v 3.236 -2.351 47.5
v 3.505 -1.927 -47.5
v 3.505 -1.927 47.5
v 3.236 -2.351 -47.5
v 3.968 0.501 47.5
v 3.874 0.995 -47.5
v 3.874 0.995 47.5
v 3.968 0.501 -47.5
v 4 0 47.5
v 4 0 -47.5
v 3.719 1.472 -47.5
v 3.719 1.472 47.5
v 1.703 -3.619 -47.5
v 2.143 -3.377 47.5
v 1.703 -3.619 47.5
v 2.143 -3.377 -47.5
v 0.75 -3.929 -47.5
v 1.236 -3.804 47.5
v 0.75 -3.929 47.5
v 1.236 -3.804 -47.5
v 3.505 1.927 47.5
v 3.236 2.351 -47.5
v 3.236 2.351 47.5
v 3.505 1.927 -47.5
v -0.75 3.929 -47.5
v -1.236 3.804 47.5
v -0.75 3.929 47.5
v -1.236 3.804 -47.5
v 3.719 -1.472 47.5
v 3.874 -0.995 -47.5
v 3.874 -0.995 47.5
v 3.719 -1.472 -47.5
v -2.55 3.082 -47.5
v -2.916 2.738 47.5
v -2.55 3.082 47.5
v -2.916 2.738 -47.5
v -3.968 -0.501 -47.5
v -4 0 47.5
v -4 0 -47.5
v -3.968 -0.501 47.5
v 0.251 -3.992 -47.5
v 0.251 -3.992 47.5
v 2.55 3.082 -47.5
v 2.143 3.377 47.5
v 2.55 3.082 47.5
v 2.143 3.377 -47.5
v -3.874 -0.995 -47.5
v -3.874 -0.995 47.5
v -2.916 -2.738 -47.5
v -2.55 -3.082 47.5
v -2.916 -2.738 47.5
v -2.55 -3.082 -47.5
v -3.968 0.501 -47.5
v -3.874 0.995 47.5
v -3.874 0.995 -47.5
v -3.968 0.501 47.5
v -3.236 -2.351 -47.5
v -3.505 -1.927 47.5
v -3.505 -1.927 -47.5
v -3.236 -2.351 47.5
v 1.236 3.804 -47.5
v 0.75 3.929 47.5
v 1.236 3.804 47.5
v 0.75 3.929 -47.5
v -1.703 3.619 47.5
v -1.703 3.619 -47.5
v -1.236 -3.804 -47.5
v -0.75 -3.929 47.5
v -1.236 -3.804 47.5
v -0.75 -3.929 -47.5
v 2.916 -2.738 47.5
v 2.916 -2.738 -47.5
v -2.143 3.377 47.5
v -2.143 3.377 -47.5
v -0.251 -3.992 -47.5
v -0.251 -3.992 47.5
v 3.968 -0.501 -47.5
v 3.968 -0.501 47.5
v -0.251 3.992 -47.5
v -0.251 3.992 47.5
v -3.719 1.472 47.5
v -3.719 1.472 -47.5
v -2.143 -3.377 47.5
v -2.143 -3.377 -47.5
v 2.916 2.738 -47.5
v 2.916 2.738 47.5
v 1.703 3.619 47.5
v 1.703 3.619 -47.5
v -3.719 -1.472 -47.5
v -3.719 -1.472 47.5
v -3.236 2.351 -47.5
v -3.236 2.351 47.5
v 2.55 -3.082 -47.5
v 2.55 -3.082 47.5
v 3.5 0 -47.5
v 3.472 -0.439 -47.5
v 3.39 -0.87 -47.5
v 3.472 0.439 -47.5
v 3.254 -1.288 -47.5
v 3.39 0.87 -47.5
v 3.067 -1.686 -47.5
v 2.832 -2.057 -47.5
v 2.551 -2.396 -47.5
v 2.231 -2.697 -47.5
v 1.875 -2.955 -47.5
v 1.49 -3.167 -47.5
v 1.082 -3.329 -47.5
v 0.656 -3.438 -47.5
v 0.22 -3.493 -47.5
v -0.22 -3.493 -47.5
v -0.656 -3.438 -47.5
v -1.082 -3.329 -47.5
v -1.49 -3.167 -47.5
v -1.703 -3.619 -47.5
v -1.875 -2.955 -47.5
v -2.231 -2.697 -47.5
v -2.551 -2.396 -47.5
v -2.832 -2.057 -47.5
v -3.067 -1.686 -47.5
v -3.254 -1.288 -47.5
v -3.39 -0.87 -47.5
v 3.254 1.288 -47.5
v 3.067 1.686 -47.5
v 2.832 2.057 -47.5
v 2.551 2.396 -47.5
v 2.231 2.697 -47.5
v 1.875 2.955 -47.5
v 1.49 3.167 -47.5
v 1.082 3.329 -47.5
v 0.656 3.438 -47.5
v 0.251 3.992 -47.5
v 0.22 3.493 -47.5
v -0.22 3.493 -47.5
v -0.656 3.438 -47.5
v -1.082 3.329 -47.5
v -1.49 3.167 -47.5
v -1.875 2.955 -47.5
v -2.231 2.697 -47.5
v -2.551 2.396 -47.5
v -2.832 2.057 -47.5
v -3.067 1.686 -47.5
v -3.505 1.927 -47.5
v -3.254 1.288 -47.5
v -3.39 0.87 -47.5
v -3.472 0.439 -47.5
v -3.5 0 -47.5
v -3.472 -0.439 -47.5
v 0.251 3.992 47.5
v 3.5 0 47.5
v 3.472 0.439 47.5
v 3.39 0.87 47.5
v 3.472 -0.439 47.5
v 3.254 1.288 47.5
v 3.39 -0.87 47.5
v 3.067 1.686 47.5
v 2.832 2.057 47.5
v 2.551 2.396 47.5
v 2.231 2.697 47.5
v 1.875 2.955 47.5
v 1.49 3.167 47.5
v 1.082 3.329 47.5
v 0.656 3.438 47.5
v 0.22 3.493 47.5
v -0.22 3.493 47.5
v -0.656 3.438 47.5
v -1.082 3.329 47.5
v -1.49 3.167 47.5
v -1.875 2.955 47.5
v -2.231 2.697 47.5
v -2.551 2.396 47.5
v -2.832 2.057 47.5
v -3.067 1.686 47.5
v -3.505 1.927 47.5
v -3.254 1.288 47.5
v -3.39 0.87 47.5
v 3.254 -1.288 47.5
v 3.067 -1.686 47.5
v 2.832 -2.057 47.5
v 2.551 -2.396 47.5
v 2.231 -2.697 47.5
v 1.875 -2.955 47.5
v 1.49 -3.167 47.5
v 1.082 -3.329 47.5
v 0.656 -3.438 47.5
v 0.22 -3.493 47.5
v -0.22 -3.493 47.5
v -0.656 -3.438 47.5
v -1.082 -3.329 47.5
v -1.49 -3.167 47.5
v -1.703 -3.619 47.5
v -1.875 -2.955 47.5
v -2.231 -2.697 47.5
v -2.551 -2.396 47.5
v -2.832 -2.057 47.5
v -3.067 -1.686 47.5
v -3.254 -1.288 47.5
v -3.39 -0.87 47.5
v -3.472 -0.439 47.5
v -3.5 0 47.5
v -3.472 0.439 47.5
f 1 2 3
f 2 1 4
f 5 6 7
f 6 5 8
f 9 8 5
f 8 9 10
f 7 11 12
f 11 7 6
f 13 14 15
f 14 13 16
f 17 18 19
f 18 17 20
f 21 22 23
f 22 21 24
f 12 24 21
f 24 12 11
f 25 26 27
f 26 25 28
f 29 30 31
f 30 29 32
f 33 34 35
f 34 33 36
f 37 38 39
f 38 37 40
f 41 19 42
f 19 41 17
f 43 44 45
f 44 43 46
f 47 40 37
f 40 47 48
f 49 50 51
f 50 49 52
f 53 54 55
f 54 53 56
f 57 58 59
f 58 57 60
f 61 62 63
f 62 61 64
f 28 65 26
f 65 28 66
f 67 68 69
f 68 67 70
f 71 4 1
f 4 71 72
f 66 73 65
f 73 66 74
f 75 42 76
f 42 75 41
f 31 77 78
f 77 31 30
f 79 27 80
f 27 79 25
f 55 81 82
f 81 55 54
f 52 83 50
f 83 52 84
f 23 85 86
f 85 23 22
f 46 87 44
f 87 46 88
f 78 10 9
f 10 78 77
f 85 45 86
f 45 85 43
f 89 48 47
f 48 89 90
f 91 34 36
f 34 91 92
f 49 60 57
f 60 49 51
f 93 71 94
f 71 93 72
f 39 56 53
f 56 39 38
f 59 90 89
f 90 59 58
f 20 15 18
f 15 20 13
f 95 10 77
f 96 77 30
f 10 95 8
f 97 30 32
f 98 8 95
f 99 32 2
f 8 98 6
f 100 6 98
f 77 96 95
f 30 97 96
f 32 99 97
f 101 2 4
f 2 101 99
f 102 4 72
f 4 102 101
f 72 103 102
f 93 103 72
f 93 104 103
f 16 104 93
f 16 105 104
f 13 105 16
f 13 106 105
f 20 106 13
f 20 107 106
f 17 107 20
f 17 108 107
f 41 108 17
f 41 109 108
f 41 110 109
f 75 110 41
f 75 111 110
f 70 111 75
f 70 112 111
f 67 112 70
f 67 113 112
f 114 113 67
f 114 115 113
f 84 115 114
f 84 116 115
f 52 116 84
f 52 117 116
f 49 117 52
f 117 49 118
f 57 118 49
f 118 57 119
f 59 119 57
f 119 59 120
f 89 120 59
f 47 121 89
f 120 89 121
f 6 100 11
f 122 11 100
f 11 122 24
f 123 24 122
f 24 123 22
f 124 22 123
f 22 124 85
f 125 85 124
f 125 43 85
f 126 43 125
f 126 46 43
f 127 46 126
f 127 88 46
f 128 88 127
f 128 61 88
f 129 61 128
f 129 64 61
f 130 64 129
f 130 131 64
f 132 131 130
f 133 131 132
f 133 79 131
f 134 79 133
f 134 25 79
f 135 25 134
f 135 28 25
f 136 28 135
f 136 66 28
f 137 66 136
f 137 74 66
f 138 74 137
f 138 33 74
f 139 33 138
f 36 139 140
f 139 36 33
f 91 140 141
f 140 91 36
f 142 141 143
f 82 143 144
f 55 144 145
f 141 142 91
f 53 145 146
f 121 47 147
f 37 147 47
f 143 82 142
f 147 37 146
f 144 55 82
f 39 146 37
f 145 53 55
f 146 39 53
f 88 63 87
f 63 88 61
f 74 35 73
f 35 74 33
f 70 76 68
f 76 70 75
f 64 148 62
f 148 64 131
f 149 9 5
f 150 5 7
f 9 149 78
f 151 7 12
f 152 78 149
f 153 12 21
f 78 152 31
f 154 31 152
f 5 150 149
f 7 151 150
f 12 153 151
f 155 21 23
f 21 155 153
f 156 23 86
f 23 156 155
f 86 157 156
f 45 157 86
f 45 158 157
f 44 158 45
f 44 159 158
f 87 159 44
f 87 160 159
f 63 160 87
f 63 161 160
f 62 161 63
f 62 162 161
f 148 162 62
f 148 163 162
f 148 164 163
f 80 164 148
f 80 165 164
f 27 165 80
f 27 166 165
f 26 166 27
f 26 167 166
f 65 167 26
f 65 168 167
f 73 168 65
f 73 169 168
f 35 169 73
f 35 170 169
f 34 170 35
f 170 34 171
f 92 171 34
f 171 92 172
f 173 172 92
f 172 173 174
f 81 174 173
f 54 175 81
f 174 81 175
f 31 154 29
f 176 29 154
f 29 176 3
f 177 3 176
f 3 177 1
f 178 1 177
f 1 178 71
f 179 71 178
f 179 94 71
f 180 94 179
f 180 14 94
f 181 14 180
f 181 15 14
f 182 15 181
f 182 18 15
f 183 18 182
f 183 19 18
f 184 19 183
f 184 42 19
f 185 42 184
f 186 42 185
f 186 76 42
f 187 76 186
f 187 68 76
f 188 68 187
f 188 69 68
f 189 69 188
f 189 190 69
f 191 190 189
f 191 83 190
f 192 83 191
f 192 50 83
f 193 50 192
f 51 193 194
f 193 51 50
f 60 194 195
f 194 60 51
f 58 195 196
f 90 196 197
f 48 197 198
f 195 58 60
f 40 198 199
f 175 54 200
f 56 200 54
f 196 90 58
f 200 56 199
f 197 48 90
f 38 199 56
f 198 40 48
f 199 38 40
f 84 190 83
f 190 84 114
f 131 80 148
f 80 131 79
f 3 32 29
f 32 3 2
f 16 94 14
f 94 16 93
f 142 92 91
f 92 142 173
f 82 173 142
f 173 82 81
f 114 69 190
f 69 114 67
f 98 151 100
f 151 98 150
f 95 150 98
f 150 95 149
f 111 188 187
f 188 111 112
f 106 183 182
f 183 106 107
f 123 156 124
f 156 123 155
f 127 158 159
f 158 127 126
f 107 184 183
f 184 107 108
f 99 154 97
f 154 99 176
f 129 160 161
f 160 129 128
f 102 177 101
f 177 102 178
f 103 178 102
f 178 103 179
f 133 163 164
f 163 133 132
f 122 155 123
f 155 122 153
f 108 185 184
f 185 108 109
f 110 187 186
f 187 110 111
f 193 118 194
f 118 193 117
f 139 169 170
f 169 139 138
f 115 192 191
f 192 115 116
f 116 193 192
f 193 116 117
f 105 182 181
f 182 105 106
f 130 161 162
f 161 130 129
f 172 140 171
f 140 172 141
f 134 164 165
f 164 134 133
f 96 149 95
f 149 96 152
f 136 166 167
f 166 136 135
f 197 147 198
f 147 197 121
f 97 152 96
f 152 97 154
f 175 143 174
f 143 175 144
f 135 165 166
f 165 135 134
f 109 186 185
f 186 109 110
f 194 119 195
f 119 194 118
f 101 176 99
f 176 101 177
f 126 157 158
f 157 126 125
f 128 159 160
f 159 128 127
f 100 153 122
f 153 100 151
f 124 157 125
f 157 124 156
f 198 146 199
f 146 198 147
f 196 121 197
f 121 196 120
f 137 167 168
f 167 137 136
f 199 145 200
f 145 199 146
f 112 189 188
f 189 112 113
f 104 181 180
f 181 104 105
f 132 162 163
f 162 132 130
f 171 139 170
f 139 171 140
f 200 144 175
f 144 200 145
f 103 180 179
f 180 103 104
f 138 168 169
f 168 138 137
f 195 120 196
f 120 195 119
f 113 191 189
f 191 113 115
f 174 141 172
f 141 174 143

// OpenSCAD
$fn = 50;


difference() {
	union() {
		translate(v = [0, 0, -47.5000000000]) {
			cylinder(h = 95, r = 4.0000000000);
		}
	}
	union() {
		translate(v = [0, 0, -100.0000000000]) {
			cylinder(h = 200, r = 3.5000000000);
		}
	}
}
